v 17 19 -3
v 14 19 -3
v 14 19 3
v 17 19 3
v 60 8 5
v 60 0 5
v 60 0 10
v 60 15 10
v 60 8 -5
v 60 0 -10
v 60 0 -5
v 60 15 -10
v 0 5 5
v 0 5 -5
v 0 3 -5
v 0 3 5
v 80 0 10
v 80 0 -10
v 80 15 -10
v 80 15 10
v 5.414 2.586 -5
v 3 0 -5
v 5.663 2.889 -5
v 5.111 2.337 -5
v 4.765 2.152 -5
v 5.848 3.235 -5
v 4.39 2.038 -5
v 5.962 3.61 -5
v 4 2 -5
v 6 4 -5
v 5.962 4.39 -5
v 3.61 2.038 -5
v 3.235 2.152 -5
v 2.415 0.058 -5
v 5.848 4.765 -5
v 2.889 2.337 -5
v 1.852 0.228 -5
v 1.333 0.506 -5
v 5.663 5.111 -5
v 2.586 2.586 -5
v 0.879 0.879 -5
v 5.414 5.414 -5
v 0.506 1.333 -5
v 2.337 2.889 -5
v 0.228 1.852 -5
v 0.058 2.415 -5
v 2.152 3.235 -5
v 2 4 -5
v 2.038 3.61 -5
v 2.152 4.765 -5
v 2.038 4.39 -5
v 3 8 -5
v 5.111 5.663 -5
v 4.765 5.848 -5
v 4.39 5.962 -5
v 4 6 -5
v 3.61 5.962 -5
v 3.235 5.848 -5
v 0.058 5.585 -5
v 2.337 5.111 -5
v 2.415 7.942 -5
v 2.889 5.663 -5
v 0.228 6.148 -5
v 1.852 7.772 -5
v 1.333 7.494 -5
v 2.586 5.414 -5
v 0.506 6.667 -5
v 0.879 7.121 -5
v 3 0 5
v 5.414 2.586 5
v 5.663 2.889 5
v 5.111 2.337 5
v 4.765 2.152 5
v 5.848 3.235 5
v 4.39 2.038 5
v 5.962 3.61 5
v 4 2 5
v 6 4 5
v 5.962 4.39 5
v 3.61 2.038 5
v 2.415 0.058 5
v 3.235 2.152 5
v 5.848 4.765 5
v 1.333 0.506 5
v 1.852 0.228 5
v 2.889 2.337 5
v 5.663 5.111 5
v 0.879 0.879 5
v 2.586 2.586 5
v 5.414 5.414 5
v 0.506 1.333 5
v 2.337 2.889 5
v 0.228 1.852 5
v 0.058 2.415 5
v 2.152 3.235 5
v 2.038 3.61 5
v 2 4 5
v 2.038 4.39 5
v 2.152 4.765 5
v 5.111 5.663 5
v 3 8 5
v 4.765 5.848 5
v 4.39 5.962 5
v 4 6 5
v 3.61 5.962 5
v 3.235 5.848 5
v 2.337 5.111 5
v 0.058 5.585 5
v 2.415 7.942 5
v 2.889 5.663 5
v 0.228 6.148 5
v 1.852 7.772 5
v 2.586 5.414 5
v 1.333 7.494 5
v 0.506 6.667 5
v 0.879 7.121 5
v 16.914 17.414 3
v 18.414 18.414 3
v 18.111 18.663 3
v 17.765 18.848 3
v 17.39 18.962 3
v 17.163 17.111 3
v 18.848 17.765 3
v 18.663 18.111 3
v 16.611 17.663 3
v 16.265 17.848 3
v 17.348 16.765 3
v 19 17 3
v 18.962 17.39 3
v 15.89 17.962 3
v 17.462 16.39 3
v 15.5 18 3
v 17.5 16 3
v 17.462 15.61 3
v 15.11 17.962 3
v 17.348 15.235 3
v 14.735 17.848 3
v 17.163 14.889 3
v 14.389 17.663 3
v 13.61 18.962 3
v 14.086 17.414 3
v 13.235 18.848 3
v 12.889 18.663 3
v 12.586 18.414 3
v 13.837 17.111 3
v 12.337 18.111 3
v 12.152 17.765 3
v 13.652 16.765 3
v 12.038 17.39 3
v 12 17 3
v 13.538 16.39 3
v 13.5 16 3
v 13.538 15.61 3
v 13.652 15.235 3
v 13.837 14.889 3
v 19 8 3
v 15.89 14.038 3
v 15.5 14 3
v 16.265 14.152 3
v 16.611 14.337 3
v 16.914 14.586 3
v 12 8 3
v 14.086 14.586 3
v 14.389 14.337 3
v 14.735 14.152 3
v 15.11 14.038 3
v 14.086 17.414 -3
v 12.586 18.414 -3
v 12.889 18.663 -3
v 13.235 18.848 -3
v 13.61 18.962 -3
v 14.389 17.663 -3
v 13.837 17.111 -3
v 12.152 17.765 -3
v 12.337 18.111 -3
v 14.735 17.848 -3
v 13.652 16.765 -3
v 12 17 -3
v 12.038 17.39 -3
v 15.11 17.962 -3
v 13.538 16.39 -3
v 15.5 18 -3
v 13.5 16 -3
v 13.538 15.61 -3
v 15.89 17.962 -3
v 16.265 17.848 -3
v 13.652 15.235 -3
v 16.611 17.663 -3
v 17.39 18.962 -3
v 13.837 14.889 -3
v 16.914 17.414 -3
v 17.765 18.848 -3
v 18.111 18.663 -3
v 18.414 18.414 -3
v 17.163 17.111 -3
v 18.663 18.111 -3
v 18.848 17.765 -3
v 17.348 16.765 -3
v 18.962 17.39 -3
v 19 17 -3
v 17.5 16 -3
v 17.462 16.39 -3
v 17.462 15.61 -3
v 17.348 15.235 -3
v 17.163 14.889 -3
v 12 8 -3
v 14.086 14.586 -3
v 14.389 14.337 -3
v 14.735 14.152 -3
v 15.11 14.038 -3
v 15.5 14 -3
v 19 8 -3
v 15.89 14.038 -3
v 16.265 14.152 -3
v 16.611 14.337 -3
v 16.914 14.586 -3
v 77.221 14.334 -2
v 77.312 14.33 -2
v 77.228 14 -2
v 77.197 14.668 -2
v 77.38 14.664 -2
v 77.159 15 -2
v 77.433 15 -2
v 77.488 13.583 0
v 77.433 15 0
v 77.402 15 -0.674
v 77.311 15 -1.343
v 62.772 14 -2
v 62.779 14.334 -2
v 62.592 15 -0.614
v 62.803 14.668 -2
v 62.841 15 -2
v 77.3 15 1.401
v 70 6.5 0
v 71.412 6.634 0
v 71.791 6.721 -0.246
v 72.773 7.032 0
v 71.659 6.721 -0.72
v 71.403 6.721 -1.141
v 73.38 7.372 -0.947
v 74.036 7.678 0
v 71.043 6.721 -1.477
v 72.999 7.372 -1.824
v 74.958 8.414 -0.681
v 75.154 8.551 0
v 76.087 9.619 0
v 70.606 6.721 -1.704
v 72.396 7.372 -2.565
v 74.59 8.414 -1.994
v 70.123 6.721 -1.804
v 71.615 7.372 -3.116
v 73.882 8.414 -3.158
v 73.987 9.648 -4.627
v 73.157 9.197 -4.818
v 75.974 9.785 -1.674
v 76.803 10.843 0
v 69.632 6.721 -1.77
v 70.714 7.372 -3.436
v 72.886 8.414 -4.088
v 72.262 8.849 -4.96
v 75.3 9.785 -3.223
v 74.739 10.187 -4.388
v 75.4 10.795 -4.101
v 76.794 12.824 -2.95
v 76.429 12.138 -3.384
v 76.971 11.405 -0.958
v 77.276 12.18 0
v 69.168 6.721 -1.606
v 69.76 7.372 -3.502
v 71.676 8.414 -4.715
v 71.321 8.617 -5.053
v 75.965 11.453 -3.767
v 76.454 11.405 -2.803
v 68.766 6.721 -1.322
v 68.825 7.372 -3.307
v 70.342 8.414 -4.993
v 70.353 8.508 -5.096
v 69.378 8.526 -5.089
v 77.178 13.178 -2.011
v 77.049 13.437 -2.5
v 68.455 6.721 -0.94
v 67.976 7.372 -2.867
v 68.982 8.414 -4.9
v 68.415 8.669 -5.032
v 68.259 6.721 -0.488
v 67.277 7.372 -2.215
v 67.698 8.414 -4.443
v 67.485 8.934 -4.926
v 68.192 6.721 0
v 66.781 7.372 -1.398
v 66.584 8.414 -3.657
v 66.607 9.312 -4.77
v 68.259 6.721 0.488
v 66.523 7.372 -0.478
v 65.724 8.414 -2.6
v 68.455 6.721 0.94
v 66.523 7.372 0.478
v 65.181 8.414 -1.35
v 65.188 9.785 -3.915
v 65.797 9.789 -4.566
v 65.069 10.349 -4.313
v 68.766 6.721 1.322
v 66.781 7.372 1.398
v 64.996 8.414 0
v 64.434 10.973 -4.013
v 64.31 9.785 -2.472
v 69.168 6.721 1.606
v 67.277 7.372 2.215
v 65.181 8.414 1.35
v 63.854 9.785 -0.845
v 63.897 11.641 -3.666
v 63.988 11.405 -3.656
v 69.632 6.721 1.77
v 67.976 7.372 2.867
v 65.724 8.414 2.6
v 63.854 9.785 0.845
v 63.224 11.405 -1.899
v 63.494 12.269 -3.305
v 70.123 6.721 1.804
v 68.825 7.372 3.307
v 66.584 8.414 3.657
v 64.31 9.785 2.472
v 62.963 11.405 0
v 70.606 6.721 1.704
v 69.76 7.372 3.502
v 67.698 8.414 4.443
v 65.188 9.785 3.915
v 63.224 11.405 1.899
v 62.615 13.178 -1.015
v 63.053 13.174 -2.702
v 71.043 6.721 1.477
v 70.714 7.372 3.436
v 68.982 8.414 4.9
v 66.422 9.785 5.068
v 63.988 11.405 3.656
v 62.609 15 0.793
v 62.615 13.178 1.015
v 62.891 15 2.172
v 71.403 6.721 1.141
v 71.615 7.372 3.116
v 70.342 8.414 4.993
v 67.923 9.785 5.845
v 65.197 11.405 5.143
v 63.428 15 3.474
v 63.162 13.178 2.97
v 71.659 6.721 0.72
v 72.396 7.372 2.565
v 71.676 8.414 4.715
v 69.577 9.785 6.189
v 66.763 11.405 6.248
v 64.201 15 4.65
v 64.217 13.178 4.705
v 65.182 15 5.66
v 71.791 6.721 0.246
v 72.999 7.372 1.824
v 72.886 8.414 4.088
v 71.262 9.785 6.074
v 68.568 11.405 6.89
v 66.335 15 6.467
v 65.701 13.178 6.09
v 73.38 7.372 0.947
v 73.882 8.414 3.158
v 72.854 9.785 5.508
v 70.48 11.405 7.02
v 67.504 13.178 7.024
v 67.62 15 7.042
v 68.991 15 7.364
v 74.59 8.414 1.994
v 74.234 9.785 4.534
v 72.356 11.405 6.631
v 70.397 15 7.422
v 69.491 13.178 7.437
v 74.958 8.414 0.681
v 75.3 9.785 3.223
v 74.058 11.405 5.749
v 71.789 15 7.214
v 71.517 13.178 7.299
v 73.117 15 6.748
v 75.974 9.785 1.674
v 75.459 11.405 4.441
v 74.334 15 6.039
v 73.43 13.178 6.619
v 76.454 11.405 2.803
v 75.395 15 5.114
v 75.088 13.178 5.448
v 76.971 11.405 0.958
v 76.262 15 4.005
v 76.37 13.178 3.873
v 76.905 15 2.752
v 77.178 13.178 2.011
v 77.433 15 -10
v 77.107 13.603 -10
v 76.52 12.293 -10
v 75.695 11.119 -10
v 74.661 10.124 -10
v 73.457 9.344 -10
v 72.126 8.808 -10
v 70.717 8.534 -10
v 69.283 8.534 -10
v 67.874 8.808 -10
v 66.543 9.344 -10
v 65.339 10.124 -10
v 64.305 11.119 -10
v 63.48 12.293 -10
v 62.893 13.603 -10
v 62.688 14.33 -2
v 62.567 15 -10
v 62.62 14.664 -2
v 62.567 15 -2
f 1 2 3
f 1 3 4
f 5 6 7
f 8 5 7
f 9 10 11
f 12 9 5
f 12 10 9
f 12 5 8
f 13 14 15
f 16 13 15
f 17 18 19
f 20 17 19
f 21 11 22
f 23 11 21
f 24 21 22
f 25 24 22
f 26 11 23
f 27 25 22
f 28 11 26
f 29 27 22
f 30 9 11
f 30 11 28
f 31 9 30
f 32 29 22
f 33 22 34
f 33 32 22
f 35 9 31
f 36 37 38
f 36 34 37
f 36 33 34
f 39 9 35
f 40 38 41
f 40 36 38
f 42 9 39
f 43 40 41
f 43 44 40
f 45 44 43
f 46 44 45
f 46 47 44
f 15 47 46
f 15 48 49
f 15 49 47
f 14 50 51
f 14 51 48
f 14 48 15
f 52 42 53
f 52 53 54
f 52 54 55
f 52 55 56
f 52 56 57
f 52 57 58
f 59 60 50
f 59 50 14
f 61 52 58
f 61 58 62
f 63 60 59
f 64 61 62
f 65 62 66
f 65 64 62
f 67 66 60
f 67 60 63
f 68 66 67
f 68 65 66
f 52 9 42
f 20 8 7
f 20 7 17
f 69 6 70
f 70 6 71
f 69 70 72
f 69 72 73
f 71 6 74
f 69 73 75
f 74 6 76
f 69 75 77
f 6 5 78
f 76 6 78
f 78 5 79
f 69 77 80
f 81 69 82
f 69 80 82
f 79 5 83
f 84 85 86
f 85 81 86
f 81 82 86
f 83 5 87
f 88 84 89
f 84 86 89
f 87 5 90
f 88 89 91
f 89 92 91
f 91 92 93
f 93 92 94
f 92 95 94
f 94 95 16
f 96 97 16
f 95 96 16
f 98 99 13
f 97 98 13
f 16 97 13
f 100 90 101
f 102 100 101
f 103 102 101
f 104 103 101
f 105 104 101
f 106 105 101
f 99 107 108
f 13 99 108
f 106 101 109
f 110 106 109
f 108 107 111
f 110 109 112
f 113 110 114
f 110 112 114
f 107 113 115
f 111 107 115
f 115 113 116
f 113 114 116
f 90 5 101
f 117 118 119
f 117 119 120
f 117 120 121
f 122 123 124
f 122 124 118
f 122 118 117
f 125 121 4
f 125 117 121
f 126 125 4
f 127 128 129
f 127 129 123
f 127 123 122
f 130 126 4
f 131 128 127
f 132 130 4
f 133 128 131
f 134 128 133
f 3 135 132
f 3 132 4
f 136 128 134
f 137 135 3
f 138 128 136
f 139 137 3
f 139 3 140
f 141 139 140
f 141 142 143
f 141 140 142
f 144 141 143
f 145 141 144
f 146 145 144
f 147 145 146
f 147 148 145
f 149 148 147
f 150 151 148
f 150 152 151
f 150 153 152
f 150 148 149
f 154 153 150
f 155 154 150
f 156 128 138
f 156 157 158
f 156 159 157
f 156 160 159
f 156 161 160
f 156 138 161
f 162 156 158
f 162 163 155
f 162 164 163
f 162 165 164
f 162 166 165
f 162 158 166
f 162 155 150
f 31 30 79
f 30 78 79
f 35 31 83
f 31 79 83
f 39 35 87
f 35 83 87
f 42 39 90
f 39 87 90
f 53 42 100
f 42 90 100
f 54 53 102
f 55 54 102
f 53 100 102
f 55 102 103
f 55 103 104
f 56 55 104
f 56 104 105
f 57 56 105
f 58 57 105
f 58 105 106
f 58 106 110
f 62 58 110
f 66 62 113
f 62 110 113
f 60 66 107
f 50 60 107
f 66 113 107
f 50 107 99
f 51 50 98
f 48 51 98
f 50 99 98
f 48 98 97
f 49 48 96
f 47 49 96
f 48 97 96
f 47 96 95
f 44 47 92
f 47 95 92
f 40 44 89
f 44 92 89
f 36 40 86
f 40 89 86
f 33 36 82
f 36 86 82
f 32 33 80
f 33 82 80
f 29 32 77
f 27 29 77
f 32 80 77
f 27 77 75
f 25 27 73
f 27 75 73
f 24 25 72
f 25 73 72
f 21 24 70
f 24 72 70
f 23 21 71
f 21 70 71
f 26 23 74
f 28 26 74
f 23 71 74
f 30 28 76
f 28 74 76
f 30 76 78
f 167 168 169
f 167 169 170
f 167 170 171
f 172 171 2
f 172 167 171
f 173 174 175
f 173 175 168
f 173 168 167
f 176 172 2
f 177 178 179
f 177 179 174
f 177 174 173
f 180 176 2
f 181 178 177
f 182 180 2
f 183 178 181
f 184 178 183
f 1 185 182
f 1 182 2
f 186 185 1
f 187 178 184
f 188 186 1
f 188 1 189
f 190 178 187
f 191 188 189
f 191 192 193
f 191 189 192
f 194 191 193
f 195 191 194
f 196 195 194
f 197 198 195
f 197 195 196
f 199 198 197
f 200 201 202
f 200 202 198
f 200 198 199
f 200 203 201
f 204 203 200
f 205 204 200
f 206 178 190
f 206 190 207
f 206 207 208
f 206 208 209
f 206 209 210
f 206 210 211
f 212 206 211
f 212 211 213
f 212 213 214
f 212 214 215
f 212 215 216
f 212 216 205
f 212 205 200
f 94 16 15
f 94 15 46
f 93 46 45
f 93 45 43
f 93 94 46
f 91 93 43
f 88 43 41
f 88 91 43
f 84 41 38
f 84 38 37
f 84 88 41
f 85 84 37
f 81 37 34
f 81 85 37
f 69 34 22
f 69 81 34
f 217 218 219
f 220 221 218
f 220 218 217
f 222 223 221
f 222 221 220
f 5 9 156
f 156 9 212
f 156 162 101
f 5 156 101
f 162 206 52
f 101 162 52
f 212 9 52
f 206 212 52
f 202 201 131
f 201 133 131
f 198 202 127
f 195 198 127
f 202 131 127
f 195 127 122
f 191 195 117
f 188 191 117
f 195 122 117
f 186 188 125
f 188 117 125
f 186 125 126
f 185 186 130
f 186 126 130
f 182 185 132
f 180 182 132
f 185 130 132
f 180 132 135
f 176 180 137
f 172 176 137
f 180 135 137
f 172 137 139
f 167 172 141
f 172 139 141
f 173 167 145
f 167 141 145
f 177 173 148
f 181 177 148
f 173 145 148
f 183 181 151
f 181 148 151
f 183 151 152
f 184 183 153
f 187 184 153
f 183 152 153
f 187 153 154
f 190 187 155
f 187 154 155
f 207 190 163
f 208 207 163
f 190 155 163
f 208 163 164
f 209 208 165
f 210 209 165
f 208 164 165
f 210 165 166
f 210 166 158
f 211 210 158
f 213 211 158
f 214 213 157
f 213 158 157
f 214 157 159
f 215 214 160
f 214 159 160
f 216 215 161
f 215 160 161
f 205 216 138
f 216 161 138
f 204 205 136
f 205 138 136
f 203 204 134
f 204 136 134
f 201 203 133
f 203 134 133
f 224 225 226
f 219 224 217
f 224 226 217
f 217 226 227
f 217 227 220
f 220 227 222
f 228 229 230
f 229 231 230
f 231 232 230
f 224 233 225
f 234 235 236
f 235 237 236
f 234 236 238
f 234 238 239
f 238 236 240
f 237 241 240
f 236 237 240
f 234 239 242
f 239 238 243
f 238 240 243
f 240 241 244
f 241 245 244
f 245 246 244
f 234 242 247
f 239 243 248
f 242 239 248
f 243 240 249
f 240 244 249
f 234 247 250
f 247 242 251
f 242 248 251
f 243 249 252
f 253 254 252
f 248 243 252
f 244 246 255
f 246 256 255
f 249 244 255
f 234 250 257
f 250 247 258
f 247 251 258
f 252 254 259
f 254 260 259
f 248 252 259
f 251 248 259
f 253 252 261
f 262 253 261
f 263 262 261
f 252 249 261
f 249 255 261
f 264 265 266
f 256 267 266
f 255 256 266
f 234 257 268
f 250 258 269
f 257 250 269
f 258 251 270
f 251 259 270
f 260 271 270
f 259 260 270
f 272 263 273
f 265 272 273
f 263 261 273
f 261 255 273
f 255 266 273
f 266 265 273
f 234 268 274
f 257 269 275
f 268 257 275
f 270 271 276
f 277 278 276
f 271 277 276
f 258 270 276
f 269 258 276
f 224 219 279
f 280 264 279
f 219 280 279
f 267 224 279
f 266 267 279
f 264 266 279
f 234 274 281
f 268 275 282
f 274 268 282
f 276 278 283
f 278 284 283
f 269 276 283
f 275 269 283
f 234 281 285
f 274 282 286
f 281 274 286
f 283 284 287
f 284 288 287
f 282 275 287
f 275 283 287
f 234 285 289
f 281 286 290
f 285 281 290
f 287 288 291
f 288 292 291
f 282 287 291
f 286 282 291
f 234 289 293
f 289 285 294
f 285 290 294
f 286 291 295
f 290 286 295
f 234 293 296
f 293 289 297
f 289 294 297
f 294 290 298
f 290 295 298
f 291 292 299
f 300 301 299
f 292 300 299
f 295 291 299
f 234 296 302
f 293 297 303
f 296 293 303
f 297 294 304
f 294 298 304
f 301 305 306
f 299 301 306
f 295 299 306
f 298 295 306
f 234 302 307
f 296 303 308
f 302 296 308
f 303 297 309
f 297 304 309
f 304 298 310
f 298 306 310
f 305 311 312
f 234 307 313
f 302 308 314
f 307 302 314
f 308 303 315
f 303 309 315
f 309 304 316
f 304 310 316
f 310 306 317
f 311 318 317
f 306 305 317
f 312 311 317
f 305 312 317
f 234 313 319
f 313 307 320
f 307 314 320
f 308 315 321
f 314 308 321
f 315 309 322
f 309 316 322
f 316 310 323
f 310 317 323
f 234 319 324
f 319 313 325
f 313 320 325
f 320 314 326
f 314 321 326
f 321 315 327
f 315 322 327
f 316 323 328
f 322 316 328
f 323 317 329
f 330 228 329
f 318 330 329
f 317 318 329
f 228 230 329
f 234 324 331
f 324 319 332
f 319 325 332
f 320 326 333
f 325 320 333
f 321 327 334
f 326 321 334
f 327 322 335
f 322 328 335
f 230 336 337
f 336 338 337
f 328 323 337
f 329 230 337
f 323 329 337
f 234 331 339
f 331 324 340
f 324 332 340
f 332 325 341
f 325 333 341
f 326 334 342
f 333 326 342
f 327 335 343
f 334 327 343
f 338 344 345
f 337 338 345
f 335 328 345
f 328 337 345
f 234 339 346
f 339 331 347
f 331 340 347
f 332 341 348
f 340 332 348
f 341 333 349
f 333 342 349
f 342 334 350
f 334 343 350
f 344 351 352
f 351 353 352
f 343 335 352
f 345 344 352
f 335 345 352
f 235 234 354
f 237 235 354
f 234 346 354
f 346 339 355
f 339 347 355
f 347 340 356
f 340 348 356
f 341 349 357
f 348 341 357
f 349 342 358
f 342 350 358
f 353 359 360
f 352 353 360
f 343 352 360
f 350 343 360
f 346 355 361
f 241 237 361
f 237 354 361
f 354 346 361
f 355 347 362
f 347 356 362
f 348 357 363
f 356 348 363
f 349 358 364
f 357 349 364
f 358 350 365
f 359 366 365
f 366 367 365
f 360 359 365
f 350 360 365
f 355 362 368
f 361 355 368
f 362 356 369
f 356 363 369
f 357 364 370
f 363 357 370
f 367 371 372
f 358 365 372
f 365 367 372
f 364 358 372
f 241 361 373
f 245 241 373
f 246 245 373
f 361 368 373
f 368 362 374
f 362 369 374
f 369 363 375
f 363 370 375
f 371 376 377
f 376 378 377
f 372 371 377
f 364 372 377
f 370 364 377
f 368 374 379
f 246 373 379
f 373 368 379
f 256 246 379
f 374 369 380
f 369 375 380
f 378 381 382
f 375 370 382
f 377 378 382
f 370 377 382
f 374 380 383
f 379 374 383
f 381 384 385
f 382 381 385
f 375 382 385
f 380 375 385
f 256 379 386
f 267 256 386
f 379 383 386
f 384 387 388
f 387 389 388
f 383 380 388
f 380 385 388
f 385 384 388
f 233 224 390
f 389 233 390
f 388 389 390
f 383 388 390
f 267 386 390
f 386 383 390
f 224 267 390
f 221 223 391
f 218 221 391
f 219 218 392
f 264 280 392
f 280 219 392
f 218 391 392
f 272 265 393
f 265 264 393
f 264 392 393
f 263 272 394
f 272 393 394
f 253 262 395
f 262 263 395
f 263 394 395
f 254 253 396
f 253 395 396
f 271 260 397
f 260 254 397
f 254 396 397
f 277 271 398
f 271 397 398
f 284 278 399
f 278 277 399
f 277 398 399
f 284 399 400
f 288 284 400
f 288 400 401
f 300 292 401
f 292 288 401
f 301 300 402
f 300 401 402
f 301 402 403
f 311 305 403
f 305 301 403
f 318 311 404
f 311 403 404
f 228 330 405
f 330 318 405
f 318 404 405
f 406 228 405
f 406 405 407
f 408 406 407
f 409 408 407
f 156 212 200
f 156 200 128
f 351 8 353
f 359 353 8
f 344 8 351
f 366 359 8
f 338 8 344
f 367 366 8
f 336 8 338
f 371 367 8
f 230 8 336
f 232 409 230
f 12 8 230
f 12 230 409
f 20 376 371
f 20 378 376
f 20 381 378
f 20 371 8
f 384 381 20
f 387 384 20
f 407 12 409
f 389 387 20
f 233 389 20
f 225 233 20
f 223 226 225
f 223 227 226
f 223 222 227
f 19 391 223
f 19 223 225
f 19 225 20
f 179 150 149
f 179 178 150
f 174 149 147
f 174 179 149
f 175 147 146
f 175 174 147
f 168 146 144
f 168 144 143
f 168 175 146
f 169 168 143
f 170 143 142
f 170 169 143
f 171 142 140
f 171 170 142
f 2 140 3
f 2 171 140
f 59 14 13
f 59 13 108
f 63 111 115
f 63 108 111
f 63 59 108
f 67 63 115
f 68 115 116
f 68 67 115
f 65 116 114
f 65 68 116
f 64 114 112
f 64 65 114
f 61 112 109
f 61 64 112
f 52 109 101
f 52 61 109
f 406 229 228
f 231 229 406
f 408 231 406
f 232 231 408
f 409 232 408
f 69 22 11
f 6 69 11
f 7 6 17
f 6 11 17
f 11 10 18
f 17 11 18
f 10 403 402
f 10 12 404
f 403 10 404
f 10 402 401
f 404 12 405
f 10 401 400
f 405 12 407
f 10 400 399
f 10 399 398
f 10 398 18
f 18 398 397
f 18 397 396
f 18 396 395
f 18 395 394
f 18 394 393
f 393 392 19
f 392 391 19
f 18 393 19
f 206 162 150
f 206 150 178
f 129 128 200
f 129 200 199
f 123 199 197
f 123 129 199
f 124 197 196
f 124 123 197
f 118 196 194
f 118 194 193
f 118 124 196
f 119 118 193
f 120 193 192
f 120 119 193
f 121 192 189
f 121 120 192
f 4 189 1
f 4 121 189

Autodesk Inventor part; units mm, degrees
ref_plane "YZ Plane" through (0, 0, 0) normal (1, 0, 0) x (0, 1, 0)
ref_plane "XZ Plane" through (0, 0, 0) normal (0, 1, 0) x (-1, 0, 0)
ref_plane "XY Plane" through (0, 0, 0) normal (0, 0, 1) x (1, 0, 0)
sketch "草圖1" plane through (0, 0, 0) normal (0, 0, 1) x (1, 0, 0)
  line L0 (0, 0) -> (80, 0)
  line L1 (80, 0) -> (80, 8)
  line L2 (60, 8) -> (0, 8)
  line L3 (0, 8) -> (0, 0)
  line L4 (80, 8) -> (60, 8)
  line L5 (60, 8) -> (60, 15)
  line L6 (60, 15) -> (80, 15)
  line L7 (80, 15) -> (80, 8)
  dimension "d0" = 80
  dimension "d1" = 20
  dimension "d2" = 15
  dimension "d3" = 8
extrude "擠出1" add sketch "草圖1" along normal mid plane 20
sketch "草圖2" plane through (0, 0, 0) normal (0, 0, 1) x (1, 0, 0)
  line L0 (70, 31.4394) -> (70, 6.5)
  line L1 (60, 15) -> (80, 15) projected
  line L2 (80, 0) -> (80, 15) projected
  arc A0 (70, 6.5) -> (70, 21.5) centre (70, 14) ccw
  line L3 (70, 14) -> (77.5, 14)
  point P0 (0, 0)
  dimension "d14" = 7.5
  dimension "d16" = 10
  dimension "d56" = 1
sketch "草圖3" plane through (0, 8, -10) normal (0, 1, 0) x (1, 0, 0)
  line L0 (60, 0) -> (60, -20) projected
  line L1 (0, 0) -> (60, 0)
  line L2 (60, 0) -> (60, -5)
  line L3 (60, -5) -> (0, -5)
  line L4 (0, -5) -> (0, 0)
  line L5 (0, -20) -> (60, -20)
  line L6 (60, -20) -> (60, -15)
  line L7 (60, -15) -> (0, -15)
  line L8 (0, -15) -> (0, -20)
  line L9 (60, -20) -> (0, -20) projected
  point P0 (0, -10)
  dimension "d10" = 5
  dimension "d11" = 5
extrude "擠出2" cut sketch "草圖3" against normal blind 20
revolve "迴轉2" cut sketch "草圖2" angle 360 about axis through (70, 31.4394, 0) along (0, -1, 0)
sketch "草圖4" plane through (0, 8, 5) normal (0, 1, 0) x (1, 0, 0)
  line L0 (12, 8) -> (19, 8)
  line L1 (19, 8) -> (19, 2)
  line L2 (19, 2) -> (12, 2)
  line L3 (12, 2) -> (12, 8)
  point P0 (0, 5)
  dimension "d34" = 3
  dimension "d35" = 6
  dimension "d36" = 7
  dimension "d37" = 12
extrude "擠出3" add sketch "草圖4" along normal blind 11
sketch "草圖7" plane through (12, 8, 3) normal (0, 0, 1) x (1, 0, 0)
  circle A0 centre (3.5, 8) radius 2
  line L0 (7, 0) -> (0, 0) projected
  line L1 (7, 0) -> (7, 11) projected
  line L2 (0, 11) -> (7, 11) projected
  line L3 (0, 0) -> (0, 11) projected
  point P0 (-12, -8)
  dimension "d38" = 3.5
  dimension "d39" = 4
  dimension "d40" = 3
extrude "擠出6" cut sketch "草圖7" against normal blind 10 contours A0
fillet "圓角3" radius 2 2 edges at (12, 19, 0) (19, 19, 0)
fillet "圓角2" radius 3 2 edges at (0, 8, 0) (0, 0, 0)
sketch "草圖6" plane through (60, 0, 5) normal (0, 0, 1) x (1, 0, 0)
  arc A0 (-57, 8) -> (-60, 5) centre (-57, 5) ccw projected
  arc A1 (-60, 3) -> (-57, 0) centre (-57, 3) ccw projected
  circle A2 centre (-56, 4) radius 2
  line L0 (-57, 8) -> (0, 8) projected
  line L1 (-60, 3) -> (-60, 5) projected
  point P0 (-60, 0)
  dimension "d29" = 4
  dimension "d30" = 4
  dimension "d31" = 4
extrude "擠出5" cut sketch "草圖6" against normal through all
sketch "草圖10" plane through (0, 0, -10) normal (0, 0, -1) x (-1, 0, 0)
  circle A0 centre (-70, 16) radius 7.5
  line L0 (-60, 15) -> (-80, 15) projected
  point P0 (0, 0)
  dimension "d52" = 15
  dimension "d53" = 1
extrude "擠出9" cut sketch "草圖10" against normal blind 8
properties part number "連趕2"
